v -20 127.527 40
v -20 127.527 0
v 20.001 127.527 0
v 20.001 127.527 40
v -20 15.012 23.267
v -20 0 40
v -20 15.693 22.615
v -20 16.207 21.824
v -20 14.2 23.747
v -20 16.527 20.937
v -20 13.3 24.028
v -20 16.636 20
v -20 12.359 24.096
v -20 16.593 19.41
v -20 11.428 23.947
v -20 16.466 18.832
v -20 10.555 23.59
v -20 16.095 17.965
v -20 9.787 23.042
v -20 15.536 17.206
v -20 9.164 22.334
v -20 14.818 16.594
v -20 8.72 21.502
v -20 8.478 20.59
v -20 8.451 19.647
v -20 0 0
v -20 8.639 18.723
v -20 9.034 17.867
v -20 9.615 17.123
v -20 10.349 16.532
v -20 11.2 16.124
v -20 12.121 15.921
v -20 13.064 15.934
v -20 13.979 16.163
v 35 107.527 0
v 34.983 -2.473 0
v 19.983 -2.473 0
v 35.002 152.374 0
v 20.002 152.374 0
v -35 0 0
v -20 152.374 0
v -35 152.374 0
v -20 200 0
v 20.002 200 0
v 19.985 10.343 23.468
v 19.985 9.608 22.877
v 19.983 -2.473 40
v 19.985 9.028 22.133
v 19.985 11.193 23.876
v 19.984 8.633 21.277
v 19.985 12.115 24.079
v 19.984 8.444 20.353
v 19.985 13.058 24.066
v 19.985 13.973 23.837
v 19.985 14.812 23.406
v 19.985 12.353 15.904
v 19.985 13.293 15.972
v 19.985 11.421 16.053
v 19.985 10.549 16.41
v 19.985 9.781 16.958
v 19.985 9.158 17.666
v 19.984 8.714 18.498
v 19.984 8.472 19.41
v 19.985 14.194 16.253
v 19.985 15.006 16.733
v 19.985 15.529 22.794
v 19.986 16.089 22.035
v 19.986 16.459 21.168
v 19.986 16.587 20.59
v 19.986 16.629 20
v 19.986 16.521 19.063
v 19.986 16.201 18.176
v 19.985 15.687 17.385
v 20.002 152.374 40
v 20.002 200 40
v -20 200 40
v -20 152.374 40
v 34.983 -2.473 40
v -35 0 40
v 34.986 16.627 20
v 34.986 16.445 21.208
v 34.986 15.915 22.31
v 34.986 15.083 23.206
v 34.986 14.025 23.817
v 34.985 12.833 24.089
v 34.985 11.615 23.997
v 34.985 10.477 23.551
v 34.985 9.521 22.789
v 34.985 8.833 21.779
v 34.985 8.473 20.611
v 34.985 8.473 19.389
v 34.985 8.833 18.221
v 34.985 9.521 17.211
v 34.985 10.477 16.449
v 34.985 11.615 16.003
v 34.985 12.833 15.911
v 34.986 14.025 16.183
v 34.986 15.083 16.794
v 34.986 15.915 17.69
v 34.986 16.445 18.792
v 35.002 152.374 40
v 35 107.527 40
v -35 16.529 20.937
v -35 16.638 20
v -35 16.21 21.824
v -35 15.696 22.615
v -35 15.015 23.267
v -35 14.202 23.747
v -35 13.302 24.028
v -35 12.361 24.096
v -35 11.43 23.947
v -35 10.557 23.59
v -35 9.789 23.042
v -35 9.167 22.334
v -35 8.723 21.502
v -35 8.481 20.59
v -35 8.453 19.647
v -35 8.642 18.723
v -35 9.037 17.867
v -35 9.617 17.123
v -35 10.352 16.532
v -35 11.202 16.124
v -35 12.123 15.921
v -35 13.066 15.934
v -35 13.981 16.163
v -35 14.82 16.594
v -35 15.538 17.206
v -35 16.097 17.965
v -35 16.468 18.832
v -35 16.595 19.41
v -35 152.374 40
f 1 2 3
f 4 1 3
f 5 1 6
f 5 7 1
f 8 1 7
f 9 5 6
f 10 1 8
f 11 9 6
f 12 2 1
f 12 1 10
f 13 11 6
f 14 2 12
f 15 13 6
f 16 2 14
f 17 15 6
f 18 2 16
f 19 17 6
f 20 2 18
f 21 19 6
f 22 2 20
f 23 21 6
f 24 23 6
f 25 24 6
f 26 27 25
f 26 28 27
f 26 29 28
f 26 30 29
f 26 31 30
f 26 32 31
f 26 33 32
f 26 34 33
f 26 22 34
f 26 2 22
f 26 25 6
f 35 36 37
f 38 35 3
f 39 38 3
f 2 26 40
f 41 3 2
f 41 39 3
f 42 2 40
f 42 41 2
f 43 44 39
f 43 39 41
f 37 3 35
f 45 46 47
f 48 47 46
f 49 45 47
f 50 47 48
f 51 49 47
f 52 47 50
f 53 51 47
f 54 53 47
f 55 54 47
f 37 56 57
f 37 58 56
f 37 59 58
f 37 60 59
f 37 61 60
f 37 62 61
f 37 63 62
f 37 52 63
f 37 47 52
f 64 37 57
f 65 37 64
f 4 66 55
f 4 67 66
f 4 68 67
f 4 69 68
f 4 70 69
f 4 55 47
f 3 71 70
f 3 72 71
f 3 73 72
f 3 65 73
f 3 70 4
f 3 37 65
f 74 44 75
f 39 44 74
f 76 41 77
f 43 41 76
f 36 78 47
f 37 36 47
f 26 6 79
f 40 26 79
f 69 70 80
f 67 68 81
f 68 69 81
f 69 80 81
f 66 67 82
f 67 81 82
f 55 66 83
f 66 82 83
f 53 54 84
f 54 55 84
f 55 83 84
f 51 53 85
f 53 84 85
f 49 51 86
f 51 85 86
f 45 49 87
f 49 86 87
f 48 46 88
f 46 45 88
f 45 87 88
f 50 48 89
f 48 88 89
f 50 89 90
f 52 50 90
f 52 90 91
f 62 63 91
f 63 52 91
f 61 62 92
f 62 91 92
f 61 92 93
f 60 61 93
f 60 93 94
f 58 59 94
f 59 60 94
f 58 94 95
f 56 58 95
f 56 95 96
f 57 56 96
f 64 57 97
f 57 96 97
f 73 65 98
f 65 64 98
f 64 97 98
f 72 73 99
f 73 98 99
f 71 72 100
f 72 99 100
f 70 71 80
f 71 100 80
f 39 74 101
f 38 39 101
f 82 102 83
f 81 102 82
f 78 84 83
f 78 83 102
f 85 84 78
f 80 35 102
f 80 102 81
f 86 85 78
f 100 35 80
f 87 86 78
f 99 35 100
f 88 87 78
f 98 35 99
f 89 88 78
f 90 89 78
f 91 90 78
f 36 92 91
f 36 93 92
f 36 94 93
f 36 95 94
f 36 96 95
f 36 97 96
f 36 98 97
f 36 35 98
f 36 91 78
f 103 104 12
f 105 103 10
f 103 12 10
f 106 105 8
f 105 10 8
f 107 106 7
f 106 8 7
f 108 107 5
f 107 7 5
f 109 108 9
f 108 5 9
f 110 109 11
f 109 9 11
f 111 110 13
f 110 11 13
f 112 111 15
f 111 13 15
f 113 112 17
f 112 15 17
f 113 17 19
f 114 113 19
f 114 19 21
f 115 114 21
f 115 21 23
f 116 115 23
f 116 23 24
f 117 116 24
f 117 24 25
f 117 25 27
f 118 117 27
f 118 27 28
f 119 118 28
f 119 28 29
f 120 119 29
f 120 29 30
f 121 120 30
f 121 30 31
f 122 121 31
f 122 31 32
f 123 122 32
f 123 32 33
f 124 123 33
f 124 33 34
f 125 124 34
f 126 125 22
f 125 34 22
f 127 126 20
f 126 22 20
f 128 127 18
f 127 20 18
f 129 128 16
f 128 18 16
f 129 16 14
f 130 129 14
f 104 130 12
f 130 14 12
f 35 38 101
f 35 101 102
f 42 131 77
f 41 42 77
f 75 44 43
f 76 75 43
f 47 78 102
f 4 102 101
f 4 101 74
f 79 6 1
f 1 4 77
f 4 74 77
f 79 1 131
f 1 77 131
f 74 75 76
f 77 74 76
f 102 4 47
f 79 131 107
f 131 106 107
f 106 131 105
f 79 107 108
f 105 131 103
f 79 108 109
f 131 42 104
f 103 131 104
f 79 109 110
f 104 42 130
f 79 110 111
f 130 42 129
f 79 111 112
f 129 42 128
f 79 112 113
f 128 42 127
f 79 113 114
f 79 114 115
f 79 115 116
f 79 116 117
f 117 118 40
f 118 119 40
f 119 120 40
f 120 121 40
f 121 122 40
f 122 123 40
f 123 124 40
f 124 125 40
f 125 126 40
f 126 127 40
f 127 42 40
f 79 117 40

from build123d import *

# Parameters (mm, degrees)
PAD_DEPTH    = 40
SKETCH001_R  = 4.1
POCKET_DEPTH = 70.0155982259


with BuildPart() as part:
    # Sketch (on XY_Plane of Origin) → Pad (new body)
    with BuildSketch(Plane.XY):
        Polygon((-35, 0), (-35, 110), (-35, 152.37407), (-20, 152.37407), (-20, 200), (0, 200), (20.001688, 200), (20.001688, 152.37407), (35.001688, 152.37407), (35.0001418741, 107.5269458609), (34.9829445099, -2.4730527948), (19.9829445099, -2.4730527948), (20.0008612126, 127.5269459706), (0, 127.5269459706), (-20, 127.5269459706), (-20, 0), align=None)
    extrude(amount=PAD_DEPTH)

    # Sketch001 (on Face3 of Pad) → Pocket (cut, through all)
    with BuildSketch(Plane(origin=(34.9833302911, -0.0054692826, 0), x_dir=(0.0001563397, 0.9999999878, 0), z_dir=(0.9999999878, -0.0001563397, 0))):
        with Locations((12.5324164576, 20)):
            Circle(SKETCH001_R)
    extrude(amount=-POCKET_DEPTH, mode=Mode.SUBTRACT)


solid = part.part
